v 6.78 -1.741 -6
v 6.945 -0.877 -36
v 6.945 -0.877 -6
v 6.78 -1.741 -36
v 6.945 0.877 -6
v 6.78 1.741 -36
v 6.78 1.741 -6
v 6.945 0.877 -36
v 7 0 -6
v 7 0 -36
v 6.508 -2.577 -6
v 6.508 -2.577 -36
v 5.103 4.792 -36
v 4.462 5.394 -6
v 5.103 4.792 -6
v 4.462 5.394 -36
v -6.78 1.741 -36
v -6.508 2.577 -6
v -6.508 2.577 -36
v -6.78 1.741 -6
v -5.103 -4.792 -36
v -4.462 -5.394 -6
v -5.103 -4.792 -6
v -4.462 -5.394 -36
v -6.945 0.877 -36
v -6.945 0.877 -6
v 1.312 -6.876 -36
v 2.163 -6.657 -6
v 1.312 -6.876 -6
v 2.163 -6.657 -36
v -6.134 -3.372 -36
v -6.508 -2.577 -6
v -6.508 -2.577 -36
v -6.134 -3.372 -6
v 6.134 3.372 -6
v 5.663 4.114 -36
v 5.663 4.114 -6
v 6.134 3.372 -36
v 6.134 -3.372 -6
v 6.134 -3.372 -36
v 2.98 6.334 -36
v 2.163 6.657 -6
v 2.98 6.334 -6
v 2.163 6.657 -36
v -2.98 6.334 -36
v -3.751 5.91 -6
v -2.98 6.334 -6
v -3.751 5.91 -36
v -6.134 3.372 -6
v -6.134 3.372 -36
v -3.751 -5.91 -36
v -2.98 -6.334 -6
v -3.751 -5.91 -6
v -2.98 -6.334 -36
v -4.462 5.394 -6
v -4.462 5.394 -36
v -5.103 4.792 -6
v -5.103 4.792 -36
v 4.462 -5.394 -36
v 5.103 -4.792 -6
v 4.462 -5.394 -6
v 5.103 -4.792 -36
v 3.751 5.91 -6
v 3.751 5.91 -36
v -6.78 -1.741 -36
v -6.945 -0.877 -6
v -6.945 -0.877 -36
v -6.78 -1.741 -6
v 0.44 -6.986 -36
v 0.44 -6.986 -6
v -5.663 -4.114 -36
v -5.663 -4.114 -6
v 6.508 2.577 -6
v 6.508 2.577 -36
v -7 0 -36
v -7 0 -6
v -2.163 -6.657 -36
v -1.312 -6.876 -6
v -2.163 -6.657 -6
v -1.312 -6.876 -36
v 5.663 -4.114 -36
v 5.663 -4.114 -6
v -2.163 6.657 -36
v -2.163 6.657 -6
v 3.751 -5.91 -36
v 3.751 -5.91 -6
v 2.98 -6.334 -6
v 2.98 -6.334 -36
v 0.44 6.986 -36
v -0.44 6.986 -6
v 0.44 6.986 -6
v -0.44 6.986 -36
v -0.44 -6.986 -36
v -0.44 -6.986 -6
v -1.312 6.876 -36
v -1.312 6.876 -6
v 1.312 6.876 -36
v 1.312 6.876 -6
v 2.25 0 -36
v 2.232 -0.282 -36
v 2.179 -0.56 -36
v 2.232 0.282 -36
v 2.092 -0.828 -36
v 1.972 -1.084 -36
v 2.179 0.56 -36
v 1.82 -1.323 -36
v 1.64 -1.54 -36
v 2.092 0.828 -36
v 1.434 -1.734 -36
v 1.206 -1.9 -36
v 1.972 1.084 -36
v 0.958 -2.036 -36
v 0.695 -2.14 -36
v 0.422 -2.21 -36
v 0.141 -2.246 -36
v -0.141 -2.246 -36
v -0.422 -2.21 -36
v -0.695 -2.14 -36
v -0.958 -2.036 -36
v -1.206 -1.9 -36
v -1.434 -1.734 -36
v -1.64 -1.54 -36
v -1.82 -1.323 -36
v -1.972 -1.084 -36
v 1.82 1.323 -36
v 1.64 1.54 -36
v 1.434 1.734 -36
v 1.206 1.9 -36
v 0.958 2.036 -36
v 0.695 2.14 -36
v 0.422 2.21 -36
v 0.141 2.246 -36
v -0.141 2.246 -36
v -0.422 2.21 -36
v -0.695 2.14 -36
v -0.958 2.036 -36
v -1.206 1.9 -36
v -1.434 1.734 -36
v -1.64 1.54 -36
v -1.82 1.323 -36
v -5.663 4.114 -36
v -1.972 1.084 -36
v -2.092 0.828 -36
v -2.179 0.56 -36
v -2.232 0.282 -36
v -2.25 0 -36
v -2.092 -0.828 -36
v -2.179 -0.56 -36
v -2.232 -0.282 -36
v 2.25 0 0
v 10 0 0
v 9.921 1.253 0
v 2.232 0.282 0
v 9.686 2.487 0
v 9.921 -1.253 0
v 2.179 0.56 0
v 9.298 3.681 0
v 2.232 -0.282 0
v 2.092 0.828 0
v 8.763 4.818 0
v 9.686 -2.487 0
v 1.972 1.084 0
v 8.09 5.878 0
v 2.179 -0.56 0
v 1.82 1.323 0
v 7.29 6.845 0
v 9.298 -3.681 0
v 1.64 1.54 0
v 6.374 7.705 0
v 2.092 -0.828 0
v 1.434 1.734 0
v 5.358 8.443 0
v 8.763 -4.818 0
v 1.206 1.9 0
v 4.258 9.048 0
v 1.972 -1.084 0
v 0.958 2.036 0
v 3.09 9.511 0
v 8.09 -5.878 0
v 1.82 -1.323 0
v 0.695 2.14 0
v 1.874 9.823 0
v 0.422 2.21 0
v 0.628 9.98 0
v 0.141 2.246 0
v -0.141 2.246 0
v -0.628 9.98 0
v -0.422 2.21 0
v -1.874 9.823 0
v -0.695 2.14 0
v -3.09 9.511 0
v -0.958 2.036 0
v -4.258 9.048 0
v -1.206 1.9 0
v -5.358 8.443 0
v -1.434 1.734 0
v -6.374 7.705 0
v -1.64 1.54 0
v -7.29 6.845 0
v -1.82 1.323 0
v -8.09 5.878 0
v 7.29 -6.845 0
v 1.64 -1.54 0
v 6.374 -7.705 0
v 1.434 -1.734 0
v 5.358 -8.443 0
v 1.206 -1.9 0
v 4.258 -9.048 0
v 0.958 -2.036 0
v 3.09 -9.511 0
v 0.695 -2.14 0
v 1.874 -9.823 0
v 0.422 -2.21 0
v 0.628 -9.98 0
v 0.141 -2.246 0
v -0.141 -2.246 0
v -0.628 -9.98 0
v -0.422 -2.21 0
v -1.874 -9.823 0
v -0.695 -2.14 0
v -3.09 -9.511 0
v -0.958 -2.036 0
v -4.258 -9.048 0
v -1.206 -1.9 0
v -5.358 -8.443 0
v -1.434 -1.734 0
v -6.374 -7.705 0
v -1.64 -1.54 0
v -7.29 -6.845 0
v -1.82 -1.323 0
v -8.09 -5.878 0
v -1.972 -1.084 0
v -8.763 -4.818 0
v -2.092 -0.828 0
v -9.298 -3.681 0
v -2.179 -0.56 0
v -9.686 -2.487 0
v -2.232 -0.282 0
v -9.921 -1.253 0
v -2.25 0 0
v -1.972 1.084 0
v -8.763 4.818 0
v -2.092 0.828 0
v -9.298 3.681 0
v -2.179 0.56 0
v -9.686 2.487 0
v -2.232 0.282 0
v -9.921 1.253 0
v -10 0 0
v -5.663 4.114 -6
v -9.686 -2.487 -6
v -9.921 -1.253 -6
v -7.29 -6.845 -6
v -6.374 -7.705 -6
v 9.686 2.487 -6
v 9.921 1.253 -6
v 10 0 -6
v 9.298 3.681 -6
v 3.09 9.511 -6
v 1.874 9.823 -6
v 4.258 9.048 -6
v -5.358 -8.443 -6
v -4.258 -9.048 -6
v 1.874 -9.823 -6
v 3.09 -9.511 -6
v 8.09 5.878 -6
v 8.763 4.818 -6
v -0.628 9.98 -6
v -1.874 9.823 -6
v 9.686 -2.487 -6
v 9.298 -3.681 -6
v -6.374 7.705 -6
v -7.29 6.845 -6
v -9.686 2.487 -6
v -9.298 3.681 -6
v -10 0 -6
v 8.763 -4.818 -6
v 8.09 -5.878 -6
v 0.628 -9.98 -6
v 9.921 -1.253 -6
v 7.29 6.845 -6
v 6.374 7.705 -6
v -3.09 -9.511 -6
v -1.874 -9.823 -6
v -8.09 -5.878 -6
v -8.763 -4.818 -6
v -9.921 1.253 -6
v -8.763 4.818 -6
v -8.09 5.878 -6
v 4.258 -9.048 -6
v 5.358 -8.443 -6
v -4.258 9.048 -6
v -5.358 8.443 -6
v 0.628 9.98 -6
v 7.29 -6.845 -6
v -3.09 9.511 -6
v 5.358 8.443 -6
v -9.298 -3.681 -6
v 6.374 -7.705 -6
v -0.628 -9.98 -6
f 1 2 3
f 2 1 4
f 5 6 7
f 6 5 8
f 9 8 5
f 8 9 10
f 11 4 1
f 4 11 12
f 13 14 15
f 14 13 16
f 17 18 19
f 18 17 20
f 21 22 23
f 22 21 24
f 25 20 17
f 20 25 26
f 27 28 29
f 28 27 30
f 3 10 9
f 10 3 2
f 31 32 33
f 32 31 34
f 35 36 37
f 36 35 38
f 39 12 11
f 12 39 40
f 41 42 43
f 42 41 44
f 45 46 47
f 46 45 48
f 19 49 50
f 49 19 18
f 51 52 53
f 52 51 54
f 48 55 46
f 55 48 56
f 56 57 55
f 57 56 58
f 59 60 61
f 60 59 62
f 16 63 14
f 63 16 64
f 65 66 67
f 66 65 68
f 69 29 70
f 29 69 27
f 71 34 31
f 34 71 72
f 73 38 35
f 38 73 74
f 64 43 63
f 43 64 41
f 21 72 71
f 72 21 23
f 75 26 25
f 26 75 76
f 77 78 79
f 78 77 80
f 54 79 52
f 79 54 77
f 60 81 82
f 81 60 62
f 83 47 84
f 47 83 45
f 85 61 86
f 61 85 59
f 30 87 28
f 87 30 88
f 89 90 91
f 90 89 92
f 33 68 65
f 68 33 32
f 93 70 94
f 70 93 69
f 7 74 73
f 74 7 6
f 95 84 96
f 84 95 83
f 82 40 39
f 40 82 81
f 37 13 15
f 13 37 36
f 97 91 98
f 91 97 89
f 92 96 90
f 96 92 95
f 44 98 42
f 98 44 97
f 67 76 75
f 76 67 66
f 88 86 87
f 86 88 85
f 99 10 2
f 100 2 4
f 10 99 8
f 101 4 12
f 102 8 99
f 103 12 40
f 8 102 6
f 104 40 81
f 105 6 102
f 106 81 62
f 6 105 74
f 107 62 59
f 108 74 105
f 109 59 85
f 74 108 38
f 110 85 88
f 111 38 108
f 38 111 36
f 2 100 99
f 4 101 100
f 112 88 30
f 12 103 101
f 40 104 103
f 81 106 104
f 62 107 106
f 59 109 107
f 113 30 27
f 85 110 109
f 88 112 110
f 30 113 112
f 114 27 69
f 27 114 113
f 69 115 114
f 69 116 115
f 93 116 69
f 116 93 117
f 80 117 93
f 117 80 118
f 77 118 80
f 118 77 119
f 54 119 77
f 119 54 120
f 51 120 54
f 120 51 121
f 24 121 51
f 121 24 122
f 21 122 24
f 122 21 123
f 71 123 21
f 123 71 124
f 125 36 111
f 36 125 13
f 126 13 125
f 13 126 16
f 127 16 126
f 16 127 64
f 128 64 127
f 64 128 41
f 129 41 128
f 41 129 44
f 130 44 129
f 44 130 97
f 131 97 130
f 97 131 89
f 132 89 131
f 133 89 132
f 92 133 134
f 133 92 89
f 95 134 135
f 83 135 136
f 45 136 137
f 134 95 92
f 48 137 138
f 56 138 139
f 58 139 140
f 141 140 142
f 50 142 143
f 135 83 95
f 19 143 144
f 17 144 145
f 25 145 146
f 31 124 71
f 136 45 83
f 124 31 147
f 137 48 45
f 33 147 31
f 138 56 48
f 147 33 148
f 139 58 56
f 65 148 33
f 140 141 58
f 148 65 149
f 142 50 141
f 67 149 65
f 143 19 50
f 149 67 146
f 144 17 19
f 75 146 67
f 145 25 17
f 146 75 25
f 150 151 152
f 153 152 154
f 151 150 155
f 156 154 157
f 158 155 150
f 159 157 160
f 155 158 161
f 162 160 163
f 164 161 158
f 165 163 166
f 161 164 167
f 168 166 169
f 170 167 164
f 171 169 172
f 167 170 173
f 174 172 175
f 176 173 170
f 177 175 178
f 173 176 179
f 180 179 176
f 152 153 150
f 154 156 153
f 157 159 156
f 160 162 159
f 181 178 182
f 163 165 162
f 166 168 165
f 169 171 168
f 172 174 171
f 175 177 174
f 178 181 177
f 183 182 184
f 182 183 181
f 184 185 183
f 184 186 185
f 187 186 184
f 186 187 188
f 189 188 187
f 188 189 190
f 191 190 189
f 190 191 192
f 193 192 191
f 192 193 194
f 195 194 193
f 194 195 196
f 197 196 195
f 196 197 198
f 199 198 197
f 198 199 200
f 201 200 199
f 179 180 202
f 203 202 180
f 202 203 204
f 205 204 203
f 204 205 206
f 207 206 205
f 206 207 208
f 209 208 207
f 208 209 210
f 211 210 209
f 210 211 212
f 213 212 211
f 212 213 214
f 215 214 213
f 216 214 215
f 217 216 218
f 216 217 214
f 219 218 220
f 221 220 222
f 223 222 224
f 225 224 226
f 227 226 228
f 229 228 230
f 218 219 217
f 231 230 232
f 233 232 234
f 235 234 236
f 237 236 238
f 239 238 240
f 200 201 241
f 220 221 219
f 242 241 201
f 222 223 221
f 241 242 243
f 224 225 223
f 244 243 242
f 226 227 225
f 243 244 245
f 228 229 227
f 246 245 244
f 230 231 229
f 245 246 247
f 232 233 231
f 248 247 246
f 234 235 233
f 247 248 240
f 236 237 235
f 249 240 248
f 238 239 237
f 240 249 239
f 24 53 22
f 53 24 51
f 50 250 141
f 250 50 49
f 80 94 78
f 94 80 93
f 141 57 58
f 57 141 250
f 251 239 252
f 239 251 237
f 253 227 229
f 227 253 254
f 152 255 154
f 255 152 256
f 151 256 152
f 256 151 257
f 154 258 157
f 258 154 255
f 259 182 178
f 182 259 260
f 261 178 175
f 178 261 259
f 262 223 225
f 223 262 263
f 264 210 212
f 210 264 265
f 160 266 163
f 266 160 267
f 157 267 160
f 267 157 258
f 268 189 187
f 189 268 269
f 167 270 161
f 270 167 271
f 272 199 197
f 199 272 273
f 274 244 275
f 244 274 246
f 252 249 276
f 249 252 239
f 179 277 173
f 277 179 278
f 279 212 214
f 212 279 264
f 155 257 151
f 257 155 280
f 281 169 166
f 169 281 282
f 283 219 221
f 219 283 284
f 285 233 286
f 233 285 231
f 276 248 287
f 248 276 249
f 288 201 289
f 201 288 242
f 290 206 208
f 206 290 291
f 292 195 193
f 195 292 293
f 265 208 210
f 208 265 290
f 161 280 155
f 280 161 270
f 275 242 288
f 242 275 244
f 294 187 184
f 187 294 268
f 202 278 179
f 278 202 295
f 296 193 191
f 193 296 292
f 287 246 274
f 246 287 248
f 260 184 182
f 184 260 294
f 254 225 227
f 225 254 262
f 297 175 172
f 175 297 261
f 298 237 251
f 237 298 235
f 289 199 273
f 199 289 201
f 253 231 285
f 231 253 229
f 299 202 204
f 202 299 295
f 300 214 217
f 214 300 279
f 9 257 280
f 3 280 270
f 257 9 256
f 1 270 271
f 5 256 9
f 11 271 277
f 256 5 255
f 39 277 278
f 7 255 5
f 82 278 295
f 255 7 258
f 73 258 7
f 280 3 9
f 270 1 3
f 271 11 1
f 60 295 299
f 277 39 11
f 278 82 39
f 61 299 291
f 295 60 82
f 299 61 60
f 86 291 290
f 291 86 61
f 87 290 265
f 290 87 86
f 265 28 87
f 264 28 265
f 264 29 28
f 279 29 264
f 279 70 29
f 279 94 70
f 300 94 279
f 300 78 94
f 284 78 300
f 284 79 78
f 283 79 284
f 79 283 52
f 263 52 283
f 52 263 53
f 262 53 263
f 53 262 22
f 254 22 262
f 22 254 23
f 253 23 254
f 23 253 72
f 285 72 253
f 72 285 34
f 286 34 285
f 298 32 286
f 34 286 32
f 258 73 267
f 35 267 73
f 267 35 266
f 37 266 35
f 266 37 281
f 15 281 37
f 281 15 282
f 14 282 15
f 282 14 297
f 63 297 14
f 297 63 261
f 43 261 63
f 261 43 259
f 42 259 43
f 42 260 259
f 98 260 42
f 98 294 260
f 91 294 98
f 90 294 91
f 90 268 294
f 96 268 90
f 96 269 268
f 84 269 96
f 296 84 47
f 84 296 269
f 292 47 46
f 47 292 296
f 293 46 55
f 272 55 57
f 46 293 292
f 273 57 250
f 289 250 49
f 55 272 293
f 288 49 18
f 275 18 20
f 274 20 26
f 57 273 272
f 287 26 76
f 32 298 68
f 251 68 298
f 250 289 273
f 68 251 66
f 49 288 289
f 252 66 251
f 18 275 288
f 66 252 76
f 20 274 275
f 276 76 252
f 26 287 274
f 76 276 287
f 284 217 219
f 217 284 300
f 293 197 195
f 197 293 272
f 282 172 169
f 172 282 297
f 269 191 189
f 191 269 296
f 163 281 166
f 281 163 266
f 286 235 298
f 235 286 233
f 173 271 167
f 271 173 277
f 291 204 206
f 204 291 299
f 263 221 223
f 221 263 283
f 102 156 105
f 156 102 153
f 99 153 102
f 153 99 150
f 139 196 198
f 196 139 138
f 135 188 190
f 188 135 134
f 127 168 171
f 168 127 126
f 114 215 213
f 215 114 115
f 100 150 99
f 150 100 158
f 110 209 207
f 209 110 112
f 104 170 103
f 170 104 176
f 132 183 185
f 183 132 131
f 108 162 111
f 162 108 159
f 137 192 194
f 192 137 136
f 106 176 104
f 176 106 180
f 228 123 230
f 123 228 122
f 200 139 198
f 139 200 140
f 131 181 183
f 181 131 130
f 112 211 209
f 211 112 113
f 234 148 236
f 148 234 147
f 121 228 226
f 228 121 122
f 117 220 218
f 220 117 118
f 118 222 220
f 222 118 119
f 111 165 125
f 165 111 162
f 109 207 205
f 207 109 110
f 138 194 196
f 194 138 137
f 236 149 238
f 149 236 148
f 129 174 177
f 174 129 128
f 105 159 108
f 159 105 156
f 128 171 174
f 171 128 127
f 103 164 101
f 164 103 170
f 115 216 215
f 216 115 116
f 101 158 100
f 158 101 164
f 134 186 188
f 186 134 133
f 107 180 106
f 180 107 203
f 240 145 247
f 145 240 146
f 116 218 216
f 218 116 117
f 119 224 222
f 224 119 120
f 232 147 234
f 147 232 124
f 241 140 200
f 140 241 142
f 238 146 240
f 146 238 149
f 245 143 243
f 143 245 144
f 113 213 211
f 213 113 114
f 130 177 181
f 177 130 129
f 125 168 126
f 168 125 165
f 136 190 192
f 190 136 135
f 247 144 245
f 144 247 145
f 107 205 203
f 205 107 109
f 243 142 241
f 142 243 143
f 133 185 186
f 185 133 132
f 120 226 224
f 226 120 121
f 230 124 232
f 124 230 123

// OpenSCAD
$fn = 50;


difference() {
	union() {
		translate(v = [0, 0, -36.0000000000]) {
			cylinder(h = 36, r = 7.0000000000);
		}
		translate(v = [0, 0, -6.0000000000]) {
			cylinder(h = 6, r = 10.0000000000);
		}
	}
	union() {
		#translate(v = [0, 0, -36]) {
			cylinder(h = 36, r = 2.2500000000);
		}
	}
}
